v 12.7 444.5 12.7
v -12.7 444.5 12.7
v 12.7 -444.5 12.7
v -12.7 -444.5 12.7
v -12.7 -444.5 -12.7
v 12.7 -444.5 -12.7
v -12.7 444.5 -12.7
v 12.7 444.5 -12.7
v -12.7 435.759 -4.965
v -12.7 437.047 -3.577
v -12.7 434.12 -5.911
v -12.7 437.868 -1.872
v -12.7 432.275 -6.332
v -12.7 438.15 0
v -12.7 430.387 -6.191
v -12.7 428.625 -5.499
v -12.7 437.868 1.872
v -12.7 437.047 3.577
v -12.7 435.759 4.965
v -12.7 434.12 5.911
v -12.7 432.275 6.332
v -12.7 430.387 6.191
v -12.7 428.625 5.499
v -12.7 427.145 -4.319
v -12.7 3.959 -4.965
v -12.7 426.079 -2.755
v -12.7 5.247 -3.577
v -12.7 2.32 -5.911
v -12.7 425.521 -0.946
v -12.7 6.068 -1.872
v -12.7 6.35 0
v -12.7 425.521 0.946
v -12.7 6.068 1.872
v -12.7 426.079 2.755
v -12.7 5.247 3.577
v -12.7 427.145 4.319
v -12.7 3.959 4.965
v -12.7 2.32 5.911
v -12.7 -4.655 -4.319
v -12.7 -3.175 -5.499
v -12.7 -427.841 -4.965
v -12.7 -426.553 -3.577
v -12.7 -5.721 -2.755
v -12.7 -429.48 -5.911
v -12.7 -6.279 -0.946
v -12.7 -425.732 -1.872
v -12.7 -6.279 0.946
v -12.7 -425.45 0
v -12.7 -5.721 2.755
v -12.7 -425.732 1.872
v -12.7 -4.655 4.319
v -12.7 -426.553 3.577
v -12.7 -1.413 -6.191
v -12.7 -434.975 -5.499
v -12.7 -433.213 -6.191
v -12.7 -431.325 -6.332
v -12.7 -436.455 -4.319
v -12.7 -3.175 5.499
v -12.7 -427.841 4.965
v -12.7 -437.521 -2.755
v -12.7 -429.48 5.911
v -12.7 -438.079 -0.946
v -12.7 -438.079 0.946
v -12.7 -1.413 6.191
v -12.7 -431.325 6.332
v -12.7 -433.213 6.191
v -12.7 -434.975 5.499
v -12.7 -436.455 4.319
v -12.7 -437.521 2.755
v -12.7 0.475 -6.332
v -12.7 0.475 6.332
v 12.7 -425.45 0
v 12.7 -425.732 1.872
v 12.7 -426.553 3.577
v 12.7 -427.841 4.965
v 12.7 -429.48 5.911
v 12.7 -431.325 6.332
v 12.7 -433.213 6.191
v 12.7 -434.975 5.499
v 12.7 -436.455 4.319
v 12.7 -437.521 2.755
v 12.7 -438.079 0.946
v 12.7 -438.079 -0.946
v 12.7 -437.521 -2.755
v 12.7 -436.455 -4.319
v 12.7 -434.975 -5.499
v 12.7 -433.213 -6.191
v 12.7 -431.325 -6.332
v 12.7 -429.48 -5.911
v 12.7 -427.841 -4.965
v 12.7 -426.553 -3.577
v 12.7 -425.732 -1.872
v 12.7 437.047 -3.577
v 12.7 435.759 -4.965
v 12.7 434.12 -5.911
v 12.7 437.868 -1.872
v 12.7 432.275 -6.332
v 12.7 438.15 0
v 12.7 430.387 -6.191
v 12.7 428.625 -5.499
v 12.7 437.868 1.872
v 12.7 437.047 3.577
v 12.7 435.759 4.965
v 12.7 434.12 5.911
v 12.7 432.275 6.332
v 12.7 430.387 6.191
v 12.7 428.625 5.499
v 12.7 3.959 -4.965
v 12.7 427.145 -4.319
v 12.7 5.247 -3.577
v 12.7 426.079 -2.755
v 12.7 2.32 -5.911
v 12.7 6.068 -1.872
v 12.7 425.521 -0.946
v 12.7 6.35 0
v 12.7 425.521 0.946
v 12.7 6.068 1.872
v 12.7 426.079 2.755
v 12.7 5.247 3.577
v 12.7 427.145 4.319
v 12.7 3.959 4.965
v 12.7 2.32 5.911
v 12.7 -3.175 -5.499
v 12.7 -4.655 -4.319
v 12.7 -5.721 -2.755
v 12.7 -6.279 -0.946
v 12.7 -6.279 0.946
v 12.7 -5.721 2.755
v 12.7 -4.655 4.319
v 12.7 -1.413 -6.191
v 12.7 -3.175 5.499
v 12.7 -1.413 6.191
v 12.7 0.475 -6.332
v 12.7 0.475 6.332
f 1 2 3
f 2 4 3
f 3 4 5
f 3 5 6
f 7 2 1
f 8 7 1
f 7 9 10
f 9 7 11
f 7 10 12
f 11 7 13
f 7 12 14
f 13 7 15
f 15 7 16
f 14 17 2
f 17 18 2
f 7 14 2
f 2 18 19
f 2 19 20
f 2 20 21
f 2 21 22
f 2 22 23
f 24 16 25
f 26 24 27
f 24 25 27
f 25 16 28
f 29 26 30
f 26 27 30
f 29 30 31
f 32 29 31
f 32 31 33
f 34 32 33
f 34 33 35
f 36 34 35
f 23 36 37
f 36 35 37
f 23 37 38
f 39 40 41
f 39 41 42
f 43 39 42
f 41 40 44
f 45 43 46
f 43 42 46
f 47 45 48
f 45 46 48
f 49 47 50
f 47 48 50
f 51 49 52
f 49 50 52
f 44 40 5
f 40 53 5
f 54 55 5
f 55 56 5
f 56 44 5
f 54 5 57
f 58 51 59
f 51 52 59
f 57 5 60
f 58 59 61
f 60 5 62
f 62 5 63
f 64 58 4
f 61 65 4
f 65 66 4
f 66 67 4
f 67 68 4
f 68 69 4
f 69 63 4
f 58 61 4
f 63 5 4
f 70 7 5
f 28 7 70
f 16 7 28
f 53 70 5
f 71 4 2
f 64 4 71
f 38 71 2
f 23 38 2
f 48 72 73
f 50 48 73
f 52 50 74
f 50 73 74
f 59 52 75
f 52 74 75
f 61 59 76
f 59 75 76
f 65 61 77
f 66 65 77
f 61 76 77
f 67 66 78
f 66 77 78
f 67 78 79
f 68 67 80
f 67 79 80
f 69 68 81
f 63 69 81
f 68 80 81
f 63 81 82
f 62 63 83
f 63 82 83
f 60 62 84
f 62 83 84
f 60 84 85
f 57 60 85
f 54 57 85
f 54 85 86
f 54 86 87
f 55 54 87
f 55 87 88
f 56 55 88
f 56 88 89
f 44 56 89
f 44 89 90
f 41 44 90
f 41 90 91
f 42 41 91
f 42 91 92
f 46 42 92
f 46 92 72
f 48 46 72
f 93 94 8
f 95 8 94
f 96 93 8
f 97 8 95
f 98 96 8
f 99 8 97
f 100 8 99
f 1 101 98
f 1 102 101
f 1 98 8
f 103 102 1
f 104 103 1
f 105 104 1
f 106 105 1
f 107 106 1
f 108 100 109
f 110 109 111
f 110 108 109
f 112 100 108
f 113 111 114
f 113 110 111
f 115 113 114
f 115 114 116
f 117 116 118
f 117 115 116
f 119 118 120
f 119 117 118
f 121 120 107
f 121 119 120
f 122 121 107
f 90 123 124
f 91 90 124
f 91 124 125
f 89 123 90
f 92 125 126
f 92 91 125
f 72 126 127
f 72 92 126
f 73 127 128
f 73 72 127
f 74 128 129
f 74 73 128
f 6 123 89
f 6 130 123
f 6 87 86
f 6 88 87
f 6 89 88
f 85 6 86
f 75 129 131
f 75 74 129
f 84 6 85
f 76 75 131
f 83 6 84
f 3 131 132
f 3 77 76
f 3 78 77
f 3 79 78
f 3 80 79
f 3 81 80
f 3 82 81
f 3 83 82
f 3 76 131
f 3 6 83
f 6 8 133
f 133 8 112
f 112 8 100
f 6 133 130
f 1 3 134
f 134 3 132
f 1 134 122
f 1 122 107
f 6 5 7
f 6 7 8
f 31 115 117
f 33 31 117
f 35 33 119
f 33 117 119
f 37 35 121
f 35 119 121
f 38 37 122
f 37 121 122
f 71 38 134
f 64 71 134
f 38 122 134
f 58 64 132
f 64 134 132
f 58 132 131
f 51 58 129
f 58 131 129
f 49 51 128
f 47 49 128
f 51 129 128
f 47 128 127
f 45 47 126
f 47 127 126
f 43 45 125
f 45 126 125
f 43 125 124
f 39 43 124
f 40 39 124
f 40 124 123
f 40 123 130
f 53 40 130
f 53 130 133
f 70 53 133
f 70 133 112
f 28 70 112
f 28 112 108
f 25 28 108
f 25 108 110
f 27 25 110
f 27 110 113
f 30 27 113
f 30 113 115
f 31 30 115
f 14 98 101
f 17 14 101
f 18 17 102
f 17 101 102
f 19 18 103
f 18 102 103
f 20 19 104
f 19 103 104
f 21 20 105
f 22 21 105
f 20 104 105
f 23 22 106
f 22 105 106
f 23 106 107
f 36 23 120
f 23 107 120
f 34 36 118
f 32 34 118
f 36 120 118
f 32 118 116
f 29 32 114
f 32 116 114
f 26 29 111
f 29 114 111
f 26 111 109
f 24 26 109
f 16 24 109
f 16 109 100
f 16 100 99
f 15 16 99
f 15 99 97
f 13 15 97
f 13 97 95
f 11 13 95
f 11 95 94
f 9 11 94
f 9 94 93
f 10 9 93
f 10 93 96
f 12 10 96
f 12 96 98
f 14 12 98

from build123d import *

# Parameters (mm, degrees)
F0_W     = 25.4
F0_H     = 25.4
F1_DEPTH = 444.5
F2_R     = 6.35
F3_DEPTH = 25.401
F4_R     = 6.35
F5_DEPTH = 25.401


with BuildPart() as f1:
    # F0 (on Front) → F1 (new body, symmetric)
    with BuildSketch(Plane.XZ):
        Rectangle(F0_W, F0_H)
    extrude(amount=F1_DEPTH, both=True)

    # F2 (on face) → F3 (cut, through all)
    with BuildSketch(Plane.YZ.offset(12.7)):
        with Locations((-431.8, 0)):
            Circle(F2_R)
        with Locations((431.8, 0)):
            Circle(F2_R)
    extrude(amount=-F3_DEPTH, mode=Mode.SUBTRACT)

    # F4 (on face) → F5 (cut, through all)
    with BuildSketch(Plane.YZ.offset(12.7)):
        Circle(F4_R)
    extrude(amount=-F5_DEPTH, mode=Mode.SUBTRACT)


solid = f1.part
